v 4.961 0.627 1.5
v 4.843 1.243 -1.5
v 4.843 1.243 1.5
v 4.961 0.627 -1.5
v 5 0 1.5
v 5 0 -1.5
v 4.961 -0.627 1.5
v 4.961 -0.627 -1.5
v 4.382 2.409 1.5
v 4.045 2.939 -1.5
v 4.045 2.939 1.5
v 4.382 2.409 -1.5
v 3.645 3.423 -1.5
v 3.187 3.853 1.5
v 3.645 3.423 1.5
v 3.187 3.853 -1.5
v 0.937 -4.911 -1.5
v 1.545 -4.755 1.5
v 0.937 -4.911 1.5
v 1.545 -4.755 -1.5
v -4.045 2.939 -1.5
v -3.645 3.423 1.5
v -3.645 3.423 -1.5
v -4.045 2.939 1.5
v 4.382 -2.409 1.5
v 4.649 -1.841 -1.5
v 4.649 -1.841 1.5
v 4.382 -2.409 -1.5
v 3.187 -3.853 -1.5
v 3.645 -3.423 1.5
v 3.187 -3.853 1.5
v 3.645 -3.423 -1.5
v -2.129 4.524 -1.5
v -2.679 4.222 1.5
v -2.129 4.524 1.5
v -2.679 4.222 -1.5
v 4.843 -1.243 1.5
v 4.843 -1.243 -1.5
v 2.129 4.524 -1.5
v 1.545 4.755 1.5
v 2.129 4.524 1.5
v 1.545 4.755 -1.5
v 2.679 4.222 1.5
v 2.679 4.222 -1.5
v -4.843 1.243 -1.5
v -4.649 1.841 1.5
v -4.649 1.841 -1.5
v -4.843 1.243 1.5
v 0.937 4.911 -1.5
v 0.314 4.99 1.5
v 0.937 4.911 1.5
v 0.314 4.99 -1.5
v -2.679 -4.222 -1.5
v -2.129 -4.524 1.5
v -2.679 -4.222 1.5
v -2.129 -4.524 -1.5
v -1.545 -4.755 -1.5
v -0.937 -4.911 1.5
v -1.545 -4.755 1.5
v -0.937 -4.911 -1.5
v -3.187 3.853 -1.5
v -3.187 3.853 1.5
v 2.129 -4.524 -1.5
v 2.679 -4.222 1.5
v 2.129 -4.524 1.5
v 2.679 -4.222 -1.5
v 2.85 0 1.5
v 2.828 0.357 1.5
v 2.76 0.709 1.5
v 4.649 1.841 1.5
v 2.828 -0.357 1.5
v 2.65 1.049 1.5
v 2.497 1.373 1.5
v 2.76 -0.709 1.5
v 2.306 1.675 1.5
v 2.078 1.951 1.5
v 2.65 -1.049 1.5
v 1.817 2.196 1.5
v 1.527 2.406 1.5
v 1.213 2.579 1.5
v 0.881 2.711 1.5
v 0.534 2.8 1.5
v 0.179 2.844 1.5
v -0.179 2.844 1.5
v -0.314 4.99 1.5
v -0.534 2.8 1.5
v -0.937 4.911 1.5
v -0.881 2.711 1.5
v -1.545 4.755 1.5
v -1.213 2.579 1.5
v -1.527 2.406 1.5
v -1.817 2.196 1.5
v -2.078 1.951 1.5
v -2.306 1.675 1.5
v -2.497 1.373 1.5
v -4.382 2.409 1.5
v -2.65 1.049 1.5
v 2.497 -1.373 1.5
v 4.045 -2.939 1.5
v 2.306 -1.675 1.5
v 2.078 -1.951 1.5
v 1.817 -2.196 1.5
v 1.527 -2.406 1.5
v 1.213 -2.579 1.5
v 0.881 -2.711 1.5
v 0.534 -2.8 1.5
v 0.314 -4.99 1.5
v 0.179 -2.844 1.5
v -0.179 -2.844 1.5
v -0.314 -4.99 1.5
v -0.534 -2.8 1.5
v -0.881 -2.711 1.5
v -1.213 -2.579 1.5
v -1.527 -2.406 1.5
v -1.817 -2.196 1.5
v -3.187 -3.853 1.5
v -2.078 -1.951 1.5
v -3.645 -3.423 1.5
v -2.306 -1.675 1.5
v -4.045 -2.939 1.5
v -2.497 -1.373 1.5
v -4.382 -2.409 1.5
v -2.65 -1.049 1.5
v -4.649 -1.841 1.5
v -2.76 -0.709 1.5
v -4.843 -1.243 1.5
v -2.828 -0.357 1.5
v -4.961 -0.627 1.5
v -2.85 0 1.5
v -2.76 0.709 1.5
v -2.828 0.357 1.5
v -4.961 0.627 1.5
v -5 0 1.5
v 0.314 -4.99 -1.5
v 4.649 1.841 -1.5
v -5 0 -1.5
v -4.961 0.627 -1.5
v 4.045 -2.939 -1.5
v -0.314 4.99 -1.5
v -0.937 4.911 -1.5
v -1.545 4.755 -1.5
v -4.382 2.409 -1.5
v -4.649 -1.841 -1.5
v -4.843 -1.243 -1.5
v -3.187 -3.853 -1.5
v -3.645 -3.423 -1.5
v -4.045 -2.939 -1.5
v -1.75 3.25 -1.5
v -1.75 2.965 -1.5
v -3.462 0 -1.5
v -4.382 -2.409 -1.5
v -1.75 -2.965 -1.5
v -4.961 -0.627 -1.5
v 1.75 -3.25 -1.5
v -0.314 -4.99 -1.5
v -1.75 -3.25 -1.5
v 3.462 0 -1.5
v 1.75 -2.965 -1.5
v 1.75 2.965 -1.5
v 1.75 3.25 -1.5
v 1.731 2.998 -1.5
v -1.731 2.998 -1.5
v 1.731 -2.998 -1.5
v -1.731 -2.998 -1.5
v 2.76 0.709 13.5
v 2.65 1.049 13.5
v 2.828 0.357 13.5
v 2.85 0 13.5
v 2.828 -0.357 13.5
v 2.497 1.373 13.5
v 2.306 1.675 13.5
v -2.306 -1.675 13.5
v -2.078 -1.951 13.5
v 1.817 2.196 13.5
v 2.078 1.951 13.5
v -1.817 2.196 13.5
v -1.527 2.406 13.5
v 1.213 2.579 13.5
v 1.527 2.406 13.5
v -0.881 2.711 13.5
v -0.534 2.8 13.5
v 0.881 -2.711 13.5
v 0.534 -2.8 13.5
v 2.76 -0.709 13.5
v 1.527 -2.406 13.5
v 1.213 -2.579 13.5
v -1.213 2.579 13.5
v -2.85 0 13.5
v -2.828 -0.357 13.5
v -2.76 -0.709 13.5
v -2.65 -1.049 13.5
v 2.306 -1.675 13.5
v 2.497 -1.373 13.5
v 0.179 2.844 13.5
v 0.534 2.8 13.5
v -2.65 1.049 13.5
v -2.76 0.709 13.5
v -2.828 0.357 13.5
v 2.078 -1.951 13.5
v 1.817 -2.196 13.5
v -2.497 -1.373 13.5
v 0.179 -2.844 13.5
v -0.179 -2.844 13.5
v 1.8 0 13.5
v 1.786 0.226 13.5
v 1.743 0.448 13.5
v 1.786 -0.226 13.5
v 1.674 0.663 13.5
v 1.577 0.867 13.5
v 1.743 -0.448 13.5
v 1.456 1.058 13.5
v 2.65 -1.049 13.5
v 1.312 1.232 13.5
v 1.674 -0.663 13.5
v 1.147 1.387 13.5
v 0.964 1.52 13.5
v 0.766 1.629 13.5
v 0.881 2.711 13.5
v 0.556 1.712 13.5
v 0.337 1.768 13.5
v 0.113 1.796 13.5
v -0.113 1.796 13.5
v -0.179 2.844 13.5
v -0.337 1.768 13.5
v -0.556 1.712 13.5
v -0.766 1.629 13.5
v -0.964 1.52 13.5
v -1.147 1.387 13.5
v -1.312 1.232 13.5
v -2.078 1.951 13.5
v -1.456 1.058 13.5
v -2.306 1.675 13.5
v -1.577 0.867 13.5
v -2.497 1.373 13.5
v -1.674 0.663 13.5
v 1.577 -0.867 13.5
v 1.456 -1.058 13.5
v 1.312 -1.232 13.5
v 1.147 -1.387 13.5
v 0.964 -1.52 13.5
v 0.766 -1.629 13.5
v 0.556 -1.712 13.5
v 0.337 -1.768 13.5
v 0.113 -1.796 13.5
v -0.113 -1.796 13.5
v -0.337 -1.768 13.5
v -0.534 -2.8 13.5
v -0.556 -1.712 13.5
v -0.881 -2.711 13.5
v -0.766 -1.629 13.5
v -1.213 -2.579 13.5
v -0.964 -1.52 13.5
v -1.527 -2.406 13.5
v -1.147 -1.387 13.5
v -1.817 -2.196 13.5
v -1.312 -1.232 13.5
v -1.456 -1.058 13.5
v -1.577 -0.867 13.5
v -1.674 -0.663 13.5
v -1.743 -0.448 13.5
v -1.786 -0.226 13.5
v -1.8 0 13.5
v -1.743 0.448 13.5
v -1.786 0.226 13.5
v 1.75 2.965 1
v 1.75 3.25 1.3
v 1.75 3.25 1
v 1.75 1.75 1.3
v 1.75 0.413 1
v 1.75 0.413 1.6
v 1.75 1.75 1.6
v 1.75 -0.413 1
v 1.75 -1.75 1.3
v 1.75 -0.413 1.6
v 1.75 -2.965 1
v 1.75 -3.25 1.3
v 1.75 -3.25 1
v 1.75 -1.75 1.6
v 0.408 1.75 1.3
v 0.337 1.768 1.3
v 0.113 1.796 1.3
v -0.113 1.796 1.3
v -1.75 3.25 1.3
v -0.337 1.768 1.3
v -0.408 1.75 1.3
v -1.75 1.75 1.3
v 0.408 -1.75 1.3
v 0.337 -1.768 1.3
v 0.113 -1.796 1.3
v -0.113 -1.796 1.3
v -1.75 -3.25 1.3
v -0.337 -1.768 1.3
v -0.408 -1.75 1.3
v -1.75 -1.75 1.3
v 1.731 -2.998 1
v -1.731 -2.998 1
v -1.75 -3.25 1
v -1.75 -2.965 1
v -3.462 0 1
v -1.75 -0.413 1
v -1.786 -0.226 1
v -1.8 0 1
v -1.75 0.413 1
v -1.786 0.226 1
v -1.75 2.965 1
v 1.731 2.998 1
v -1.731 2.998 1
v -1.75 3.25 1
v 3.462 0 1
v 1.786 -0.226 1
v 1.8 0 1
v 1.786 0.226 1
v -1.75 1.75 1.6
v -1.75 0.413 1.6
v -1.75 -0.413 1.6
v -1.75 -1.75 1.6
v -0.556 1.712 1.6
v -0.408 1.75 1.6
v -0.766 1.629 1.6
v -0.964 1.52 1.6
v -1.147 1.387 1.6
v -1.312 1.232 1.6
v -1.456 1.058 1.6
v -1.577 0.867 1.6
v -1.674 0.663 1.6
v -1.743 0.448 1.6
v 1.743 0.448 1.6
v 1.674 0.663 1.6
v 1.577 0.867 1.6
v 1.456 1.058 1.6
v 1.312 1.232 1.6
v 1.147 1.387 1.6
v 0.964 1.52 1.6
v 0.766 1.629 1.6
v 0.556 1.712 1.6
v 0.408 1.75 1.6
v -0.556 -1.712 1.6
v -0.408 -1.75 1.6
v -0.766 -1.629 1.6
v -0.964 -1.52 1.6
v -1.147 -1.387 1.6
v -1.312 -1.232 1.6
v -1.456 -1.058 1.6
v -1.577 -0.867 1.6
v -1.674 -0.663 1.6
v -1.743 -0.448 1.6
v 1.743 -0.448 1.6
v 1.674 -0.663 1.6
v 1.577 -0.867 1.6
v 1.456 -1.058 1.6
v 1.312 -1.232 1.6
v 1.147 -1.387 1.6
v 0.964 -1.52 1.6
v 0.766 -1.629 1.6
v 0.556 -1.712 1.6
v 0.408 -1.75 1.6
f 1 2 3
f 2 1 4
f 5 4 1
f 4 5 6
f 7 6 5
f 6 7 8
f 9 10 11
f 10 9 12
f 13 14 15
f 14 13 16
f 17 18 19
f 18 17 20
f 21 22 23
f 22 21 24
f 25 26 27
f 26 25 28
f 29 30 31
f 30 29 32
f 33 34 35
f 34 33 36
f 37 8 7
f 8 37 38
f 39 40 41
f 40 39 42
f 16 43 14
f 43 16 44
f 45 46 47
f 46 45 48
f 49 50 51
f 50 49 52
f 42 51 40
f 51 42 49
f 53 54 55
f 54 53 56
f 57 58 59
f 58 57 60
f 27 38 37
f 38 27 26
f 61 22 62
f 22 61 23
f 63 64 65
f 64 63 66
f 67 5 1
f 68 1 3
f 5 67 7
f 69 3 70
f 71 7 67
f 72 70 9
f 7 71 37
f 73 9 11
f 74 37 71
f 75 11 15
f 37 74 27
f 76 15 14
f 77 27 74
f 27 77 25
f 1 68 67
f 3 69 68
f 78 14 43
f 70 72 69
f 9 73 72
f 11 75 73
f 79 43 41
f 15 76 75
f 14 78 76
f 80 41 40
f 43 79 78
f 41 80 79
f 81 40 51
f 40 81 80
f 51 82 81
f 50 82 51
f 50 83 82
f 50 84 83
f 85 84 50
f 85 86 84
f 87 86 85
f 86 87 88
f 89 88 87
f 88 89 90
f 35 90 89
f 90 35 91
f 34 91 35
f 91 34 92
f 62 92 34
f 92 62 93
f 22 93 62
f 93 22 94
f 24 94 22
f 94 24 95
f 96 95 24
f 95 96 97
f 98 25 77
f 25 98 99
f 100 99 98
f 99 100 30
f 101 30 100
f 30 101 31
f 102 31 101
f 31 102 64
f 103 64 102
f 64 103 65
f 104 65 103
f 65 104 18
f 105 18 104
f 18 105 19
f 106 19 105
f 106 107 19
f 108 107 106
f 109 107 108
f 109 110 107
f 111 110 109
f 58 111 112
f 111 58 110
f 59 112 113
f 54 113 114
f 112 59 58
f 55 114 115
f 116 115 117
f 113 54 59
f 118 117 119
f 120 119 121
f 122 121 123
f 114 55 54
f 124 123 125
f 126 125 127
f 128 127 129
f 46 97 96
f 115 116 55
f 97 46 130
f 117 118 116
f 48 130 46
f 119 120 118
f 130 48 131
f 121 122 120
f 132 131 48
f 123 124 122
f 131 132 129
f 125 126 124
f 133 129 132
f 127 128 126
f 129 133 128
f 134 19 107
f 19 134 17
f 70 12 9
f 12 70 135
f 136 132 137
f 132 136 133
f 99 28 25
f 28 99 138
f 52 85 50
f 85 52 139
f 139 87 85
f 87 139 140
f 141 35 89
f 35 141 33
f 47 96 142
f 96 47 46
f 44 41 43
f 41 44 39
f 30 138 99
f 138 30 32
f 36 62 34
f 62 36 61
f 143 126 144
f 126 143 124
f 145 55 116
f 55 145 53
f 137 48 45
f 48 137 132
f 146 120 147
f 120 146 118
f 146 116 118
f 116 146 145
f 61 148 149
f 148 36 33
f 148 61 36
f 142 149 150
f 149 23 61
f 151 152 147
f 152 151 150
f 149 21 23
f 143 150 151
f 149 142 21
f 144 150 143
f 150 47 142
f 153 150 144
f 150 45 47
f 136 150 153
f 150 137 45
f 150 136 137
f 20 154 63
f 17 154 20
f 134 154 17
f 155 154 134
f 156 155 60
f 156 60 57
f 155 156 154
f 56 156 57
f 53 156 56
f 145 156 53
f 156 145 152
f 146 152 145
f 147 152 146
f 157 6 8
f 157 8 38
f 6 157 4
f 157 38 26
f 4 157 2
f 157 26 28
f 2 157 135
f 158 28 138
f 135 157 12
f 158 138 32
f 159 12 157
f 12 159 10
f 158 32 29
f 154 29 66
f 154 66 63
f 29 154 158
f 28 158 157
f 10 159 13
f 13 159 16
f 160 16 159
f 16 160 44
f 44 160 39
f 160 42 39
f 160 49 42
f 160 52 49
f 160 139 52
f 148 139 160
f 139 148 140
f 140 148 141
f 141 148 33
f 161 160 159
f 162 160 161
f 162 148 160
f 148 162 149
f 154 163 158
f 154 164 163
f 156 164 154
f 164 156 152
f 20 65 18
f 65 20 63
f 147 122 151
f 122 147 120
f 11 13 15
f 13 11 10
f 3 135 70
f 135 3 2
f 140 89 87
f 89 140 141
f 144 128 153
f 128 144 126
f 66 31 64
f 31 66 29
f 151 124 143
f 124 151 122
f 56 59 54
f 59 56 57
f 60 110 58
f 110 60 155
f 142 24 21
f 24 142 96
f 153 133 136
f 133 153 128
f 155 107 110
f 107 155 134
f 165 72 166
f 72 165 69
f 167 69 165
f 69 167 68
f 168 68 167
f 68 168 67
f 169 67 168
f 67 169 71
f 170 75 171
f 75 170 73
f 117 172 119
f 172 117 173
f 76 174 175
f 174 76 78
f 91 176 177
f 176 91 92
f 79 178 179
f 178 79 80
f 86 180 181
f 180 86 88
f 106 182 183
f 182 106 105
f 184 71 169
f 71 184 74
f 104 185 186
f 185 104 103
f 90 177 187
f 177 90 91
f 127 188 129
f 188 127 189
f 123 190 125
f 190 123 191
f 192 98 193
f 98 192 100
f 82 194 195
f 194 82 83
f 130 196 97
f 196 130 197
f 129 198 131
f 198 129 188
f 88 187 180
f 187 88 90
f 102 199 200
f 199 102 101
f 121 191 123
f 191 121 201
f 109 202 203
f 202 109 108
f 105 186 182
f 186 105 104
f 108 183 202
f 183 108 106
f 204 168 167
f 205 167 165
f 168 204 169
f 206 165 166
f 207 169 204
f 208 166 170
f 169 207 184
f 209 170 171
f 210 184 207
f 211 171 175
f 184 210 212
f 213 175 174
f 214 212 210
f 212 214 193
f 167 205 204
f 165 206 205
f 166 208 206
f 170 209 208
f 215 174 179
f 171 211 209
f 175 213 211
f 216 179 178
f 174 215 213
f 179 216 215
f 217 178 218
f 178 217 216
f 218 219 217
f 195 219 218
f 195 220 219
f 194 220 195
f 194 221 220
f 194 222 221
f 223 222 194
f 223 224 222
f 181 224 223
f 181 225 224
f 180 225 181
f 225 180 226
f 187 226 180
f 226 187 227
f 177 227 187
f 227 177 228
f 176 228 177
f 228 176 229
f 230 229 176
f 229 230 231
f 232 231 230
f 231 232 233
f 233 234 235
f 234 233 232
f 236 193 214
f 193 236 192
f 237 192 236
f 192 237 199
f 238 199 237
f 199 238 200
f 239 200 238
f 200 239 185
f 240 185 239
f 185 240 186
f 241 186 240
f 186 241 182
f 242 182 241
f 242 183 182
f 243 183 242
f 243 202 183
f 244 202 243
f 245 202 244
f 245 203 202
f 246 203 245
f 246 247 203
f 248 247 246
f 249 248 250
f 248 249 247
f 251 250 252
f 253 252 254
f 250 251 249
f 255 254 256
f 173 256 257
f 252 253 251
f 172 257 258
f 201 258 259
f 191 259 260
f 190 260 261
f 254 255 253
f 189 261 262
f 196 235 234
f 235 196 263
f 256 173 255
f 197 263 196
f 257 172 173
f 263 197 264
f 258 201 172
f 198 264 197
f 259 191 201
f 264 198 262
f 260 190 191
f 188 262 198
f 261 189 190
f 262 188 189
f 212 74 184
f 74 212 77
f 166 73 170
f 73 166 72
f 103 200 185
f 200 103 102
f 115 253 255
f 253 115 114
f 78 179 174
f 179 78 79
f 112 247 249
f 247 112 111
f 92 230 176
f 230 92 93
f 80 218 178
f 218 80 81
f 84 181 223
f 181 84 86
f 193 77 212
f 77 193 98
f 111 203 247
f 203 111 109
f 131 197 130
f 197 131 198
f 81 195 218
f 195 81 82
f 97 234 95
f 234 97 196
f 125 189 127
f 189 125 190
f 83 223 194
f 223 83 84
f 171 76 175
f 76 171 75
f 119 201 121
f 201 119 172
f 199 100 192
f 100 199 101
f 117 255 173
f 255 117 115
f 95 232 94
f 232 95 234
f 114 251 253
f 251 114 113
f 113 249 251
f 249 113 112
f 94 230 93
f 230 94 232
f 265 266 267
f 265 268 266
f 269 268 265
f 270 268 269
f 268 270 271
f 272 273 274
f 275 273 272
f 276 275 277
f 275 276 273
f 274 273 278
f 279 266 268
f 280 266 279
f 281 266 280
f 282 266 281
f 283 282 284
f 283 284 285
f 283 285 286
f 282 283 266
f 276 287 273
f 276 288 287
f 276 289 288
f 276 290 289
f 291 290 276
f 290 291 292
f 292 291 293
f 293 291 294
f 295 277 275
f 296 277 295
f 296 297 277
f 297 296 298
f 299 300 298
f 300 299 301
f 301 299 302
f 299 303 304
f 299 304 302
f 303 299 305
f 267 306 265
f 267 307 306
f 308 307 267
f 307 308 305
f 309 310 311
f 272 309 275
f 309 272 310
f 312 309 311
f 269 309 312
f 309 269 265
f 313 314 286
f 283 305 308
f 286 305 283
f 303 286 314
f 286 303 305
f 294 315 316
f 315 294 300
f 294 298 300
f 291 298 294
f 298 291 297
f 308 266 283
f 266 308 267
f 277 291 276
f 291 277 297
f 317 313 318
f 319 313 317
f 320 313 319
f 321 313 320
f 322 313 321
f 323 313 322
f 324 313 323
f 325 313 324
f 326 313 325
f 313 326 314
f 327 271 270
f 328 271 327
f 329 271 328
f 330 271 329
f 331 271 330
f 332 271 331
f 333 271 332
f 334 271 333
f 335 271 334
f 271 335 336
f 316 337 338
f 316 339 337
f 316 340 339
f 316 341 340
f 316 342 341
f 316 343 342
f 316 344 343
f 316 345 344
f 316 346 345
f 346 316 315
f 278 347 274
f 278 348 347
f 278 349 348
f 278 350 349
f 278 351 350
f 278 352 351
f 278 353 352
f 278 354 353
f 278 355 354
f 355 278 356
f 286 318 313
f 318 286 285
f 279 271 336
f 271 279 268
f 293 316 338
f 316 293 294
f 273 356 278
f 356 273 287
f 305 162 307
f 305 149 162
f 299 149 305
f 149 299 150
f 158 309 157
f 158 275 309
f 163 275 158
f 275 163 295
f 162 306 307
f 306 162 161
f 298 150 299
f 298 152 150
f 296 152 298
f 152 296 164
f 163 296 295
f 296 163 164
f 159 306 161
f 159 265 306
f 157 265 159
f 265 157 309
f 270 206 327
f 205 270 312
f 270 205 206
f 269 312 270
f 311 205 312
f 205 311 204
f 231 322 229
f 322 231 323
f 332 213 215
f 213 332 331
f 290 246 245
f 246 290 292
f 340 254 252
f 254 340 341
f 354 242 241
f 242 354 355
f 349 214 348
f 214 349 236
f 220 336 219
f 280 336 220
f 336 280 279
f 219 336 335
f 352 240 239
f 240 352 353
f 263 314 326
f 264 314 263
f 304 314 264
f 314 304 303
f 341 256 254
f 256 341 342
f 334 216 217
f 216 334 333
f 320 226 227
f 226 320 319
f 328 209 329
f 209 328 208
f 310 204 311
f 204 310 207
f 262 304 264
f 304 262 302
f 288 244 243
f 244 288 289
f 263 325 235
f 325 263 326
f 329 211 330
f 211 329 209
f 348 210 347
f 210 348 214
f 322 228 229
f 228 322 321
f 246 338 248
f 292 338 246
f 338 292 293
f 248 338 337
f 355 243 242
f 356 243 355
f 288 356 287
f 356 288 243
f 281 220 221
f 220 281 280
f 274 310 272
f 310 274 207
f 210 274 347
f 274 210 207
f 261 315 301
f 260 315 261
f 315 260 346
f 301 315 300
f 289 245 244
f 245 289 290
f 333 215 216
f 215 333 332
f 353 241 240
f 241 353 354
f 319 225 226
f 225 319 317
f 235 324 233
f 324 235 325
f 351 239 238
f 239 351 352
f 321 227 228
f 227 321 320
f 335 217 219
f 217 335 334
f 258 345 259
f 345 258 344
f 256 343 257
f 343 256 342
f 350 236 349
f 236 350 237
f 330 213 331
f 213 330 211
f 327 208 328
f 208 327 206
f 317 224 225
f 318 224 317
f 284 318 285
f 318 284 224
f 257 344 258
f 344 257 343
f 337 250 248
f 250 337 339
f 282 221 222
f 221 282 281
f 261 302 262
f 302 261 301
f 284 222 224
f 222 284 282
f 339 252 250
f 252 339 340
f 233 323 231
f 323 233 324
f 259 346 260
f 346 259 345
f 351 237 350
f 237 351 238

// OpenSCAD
$fn = 50;


difference() {
	union() {
		translate(v = [0, 0, -1.5000000000]) {
			cylinder(h = 3, r = 5.0000000000);
		}
		translate(v = [0, 0, -1.5000000000]) {
			cylinder(h = 15, r = 2.8500000000);
		}
	}
	union() {
		translate(v = [0, 0, -1.5000000000]) {
			rotate(a = [0, 0, 0]) {
				difference() {
					union() {
						translate(v = [-1.7500000000, -3.2500000000, -0.3000000000]) {
							cube(size = [3.5000000000, 6.5000000000, 0.3000000000]);
						}
						translate(v = [-1.7500000000, -1.7500000000, -0.6000000000]) {
							cube(size = [3.5000000000, 3.5000000000, 0.3000000000]);
						}
						translate(v = [-1.7500000000, -3.2500000000, 2.5000000000]) {
							cube(size = [3.5000000000, 6.5000000000, 0.3000000000]);
						}
						translate(v = [-1.7500000000, -1.7500000000, 2.8000000000]) {
							cube(size = [3.5000000000, 3.5000000000, 0.3000000000]);
						}
						linear_extrude(height = 2.5000000000) {
							polygon(points = [[3.4620000000, 0.0000000000], [1.7310000000, 2.9981799479], [-1.7310000000, 2.9981799479], [-3.4620000000, 0.0000000000], [-1.7310000000, -2.9981799479], [1.7310000000, -2.9981799479]]);
						}
						translate(v = [-1.7500000000, -3.2500000000, -0.3000000000]) {
							cube(size = [3.5000000000, 6.5000000000, 0.3000000000]);
						}
						translate(v = [-1.7500000000, -1.7500000000, -0.6000000000]) {
							cube(size = [3.5000000000, 3.5000000000, 0.3000000000]);
						}
						translate(v = [-1.7500000000, -3.2500000000, 2.5000000000]) {
							cube(size = [3.5000000000, 6.5000000000, 0.3000000000]);
						}
						translate(v = [-1.7500000000, -1.7500000000, 2.8000000000]) {
							cube(size = [3.5000000000, 3.5000000000, 0.3000000000]);
						}
						translate(v = [-1.7500000000, -3.2500000000, -0.3000000000]) {
							cube(size = [3.5000000000, 6.5000000000, 0.3000000000]);
						}
						translate(v = [-1.7500000000, -1.7500000000, -0.6000000000]) {
							cube(size = [3.5000000000, 3.5000000000, 0.3000000000]);
						}
						translate(v = [-1.7500000000, -3.2500000000, 2.5000000000]) {
							cube(size = [3.5000000000, 6.5000000000, 0.3000000000]);
						}
						translate(v = [-1.7500000000, -1.7500000000, 2.8000000000]) {
							cube(size = [3.5000000000, 3.5000000000, 0.3000000000]);
						}
					}
					union();
				}
			}
		}
		translate(v = [0, 0, -100.0000000000]) {
			cylinder(h = 200, r = 1.8000000000);
		}
	}
}
